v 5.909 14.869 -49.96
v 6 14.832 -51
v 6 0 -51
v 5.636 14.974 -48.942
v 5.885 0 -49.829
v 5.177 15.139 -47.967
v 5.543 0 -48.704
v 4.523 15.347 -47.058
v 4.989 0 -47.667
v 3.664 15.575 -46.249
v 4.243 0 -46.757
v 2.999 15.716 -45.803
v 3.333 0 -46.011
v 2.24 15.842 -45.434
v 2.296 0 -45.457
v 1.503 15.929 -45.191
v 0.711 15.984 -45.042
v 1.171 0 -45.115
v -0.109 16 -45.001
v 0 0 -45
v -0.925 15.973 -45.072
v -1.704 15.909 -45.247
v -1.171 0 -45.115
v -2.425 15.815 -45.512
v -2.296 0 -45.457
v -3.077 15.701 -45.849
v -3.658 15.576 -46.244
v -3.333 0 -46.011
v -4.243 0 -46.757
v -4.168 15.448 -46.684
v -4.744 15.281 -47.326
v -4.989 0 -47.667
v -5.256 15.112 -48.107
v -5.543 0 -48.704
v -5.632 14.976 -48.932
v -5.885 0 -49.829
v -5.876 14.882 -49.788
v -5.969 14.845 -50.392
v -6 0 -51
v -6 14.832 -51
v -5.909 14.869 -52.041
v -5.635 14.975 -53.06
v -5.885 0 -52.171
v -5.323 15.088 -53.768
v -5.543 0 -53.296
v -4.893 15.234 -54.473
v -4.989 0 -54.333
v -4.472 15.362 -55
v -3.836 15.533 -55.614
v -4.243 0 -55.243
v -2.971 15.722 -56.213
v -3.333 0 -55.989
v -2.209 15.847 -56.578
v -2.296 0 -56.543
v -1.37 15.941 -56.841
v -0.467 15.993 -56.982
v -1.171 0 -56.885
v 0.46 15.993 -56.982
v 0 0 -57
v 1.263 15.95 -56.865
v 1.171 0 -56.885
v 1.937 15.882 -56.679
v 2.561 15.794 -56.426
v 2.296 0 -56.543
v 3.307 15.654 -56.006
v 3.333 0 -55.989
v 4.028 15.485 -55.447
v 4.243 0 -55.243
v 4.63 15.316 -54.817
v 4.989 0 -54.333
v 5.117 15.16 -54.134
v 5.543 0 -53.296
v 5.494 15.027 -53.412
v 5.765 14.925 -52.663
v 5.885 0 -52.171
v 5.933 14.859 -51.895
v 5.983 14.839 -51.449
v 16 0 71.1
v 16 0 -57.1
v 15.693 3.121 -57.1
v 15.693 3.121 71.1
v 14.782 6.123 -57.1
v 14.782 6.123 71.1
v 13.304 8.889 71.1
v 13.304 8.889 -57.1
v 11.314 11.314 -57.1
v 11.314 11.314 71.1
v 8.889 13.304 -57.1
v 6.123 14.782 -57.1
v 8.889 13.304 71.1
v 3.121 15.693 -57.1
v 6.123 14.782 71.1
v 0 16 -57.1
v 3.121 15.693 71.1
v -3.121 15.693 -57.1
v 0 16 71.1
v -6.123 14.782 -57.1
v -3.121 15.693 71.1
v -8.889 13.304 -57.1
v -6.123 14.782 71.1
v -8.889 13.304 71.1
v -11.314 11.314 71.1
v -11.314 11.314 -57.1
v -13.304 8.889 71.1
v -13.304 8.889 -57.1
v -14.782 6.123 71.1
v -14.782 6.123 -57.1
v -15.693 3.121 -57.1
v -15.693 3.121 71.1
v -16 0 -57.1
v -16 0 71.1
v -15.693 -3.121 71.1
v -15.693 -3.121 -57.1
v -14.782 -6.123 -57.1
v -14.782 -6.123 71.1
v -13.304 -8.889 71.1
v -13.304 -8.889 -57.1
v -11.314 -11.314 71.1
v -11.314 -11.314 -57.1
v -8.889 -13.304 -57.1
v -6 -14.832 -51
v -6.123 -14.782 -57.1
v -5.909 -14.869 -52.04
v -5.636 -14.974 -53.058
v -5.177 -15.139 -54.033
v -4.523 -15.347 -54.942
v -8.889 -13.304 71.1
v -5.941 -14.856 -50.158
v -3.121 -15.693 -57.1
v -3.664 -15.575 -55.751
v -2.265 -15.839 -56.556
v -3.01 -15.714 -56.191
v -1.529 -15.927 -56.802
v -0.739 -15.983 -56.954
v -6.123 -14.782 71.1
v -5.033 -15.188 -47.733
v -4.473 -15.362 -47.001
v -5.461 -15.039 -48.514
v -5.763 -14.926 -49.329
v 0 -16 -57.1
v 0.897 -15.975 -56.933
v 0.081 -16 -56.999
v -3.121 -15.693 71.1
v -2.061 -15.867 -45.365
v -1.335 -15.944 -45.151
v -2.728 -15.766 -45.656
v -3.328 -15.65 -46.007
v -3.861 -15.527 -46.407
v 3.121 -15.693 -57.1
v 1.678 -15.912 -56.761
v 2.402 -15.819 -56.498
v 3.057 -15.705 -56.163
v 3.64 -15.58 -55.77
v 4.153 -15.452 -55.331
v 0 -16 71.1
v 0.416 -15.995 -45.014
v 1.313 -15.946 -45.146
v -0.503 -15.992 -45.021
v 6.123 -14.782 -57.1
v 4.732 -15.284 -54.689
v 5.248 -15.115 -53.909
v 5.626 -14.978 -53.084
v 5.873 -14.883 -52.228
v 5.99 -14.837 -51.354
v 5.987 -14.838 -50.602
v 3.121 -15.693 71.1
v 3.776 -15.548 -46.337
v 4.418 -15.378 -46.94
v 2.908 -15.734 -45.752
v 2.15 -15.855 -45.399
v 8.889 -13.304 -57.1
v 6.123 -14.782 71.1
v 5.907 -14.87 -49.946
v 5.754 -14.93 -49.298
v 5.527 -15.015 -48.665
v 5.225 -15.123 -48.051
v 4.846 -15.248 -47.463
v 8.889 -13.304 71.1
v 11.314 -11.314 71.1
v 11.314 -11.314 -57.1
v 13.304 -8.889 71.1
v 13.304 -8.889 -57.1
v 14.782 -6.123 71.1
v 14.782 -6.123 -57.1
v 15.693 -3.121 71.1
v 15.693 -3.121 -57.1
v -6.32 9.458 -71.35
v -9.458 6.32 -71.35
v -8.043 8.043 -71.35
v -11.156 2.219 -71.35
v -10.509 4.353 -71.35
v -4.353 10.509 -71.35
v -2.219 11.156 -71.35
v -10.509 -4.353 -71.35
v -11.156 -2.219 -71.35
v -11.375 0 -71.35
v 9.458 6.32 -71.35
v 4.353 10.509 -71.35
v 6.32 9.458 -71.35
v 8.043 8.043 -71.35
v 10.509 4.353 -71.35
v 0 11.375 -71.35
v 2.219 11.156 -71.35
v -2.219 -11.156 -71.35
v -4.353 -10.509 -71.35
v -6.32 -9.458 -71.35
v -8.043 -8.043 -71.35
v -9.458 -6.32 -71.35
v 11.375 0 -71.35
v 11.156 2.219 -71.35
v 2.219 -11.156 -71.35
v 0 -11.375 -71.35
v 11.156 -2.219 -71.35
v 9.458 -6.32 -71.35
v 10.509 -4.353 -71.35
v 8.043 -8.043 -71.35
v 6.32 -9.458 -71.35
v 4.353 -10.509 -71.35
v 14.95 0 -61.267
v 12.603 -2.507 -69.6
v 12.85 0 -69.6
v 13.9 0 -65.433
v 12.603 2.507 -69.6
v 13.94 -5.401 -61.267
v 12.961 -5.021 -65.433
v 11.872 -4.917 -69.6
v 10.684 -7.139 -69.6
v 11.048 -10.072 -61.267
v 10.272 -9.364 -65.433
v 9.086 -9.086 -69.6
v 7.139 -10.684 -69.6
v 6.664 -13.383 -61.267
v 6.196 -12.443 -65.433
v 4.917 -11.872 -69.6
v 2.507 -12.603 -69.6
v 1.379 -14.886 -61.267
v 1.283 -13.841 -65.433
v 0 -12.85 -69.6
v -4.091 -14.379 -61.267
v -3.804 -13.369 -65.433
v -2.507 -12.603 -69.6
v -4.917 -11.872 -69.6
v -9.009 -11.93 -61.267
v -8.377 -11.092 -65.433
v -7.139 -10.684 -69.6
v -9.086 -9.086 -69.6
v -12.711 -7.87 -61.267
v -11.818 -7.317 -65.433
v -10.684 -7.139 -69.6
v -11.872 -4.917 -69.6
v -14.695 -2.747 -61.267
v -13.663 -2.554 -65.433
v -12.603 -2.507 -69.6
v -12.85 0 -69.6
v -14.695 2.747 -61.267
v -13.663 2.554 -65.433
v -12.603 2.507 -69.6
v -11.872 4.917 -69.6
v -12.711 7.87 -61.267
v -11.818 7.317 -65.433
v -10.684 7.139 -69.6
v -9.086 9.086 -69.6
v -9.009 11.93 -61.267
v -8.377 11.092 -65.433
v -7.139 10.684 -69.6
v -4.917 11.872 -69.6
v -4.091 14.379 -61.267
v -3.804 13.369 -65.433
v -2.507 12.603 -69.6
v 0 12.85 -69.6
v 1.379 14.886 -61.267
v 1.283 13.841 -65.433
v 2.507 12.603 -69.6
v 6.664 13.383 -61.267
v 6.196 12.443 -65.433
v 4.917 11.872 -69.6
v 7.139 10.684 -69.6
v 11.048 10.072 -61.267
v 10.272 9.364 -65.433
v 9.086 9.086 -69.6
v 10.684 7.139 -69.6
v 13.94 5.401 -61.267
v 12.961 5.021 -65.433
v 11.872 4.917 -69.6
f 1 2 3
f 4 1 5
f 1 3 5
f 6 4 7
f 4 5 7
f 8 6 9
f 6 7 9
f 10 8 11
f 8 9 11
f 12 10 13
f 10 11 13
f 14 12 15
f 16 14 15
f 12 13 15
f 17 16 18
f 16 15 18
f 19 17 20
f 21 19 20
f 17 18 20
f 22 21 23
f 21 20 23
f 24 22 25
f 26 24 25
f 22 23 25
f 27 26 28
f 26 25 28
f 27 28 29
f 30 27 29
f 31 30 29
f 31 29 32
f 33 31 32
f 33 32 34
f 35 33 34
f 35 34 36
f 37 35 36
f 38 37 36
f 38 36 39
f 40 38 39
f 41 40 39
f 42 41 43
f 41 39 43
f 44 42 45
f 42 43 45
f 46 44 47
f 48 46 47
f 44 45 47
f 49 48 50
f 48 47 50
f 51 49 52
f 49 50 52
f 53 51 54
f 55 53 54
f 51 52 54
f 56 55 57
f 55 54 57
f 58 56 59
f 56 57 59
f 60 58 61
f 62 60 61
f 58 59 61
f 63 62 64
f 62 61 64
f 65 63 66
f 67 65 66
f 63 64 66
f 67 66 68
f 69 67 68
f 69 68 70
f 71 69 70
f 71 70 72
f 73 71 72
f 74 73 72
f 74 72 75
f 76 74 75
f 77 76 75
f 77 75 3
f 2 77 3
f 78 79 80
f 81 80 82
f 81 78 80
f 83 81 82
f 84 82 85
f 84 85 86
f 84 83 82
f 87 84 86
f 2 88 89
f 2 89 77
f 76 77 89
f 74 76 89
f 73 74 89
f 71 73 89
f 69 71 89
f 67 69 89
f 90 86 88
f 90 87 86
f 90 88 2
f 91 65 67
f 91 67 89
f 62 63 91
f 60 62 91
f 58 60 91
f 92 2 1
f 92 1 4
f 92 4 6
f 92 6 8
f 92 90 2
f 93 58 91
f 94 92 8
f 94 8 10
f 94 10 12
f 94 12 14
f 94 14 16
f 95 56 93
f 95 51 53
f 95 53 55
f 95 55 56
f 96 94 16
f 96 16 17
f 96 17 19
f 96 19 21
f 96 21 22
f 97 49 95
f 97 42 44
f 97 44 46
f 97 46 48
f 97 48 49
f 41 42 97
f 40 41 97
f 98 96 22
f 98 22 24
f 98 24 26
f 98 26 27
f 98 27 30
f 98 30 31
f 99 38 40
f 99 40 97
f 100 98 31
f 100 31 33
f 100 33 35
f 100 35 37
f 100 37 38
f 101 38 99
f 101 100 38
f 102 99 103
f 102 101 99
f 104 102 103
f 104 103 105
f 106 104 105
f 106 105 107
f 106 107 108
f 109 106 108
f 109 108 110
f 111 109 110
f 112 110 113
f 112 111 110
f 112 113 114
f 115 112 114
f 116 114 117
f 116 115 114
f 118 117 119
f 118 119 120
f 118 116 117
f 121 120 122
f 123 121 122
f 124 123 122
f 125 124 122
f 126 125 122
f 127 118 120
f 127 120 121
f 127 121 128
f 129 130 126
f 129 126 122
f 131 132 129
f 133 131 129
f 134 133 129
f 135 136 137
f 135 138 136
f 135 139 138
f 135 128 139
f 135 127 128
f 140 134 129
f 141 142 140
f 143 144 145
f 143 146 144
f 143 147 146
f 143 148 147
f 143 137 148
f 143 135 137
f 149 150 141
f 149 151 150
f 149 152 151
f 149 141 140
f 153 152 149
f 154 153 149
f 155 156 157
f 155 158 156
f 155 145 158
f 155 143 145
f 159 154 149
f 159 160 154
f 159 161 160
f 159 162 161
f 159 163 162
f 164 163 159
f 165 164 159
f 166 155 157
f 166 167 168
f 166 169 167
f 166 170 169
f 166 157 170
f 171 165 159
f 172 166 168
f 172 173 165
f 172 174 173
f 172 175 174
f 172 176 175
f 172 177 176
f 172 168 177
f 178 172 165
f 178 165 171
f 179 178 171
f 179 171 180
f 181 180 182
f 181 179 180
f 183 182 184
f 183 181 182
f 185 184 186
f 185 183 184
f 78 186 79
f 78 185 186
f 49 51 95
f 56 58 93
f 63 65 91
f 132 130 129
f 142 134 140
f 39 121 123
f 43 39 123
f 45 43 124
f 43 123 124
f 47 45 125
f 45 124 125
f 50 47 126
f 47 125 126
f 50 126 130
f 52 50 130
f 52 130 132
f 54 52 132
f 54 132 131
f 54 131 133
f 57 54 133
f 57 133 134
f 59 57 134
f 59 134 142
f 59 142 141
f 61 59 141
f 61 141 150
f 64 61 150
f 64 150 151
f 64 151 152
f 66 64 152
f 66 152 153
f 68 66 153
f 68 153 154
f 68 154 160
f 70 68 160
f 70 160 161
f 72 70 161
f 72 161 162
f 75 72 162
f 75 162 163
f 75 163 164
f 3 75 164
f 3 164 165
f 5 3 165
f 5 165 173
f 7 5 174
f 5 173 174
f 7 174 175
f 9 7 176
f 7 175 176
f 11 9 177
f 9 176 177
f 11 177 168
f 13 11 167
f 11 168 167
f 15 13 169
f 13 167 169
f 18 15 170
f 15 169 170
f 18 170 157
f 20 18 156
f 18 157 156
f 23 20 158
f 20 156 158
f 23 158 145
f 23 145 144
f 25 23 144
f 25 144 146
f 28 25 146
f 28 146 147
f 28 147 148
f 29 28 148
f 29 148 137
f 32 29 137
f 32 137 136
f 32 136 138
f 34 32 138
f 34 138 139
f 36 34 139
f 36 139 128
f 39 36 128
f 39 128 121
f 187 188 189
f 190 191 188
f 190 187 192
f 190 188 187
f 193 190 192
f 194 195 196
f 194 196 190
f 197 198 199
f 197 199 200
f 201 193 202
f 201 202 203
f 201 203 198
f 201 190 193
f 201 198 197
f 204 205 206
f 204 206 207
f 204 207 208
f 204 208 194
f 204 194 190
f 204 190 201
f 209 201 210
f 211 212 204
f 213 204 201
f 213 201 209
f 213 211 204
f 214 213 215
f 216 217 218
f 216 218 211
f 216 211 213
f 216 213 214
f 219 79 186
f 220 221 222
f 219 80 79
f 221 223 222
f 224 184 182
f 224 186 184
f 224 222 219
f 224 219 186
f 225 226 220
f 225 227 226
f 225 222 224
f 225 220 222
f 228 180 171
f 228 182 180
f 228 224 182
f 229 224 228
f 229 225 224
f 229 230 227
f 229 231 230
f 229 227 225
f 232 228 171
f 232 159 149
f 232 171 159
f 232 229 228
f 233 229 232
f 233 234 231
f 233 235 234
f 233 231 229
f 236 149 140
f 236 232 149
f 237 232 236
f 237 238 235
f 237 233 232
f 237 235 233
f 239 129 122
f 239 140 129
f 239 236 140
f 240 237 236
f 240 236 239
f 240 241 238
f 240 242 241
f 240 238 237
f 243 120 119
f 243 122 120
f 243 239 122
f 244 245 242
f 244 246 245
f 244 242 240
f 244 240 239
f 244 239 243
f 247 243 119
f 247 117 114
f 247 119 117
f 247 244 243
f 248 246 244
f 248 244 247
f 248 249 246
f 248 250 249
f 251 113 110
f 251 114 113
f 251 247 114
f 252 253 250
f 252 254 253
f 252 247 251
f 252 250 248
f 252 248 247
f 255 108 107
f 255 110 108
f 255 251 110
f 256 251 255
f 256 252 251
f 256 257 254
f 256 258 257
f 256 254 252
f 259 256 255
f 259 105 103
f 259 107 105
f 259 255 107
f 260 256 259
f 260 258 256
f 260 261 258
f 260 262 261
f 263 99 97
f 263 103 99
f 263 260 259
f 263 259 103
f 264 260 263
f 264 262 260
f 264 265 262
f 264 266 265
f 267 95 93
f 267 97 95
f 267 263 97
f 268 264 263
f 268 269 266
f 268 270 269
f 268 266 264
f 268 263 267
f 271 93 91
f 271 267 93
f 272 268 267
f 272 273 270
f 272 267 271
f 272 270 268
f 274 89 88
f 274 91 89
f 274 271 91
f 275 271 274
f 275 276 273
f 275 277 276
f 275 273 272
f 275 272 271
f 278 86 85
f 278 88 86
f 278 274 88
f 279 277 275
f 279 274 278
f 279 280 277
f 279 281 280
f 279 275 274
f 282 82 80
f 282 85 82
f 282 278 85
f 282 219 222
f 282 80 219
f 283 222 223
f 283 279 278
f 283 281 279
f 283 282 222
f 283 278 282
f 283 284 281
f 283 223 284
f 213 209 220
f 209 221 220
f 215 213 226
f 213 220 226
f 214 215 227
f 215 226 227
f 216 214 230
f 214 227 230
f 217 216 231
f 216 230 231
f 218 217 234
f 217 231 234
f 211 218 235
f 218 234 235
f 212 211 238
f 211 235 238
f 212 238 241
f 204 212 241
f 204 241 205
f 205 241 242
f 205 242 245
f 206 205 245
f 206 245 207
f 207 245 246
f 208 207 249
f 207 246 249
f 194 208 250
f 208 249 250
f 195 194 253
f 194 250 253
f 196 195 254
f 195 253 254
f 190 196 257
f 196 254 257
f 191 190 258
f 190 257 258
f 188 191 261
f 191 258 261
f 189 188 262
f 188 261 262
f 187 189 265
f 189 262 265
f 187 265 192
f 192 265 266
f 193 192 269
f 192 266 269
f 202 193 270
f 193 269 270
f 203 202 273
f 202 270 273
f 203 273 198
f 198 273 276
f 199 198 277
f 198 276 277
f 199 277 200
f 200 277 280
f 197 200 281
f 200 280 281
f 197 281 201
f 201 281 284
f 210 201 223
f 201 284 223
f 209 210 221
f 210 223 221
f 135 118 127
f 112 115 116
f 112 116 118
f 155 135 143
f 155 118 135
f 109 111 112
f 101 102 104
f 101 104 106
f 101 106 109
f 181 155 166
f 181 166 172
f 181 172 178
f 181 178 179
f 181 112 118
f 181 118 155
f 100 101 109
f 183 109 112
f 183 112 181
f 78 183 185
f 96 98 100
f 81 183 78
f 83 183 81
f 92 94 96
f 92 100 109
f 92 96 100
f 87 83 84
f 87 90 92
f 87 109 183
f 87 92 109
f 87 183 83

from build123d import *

# Parameters (mm, degrees)
F1_R      = 16
F2_DEPTH  = 71.1
F3_DEPTH  = 57.1
F3_FACE_R = 16
F5_R      = 12.85
F8_R      = 11.375
F6_FACE_R = 12.85
F10_D     = 12
F10_DEPTH = 16.0010001
F12_D     = 12


with BuildPart() as f2:
    # F1 (on Top) → F2 (new body)
    with BuildSketch(Plane.XY):
        Circle(F1_R)
    extrude(amount=F2_DEPTH)

    # F3 (add): a face of the model
    f3_faces = [f2.faces().sort_by_distance(p)[0] for p in [
        (0, 0, 0),
    ]]
    extrude(f3_faces, amount=F3_DEPTH)

    # F3_face (on face) → F6 section 0
    with BuildSketch(Plane(origin=(0, 0, -57.1), x_dir=(1, 0, 0), z_dir=(0, 0, -1))):
        Circle(F3_FACE_R)
    # F5 (on offset) → F6 section 1
    with BuildSketch(Plane(origin=(0, 0, -69.6), x_dir=(1, 0, 0), z_dir=(0, 0, -1))):
        Circle(F5_R)
    loft()

    # F8 (on offset) → F9 section 0
    with BuildSketch(Plane(origin=(0, 0, -71.35), x_dir=(1, 0, 0), z_dir=(0, 0, -1))):
        Circle(F8_R)
    # F6_face (on face) → F9 section 1
    with BuildSketch(Plane(origin=(0, 0, -69.6), x_dir=(1, 0, 0), z_dir=(0, 0, -1))):
        Circle(F6_FACE_R)
    loft()

    # F10 (through all, one way)
    with BuildSketch(Plane.XZ):
        with Locations((0, -51)):
            Circle(F10_D / 2)
    extrude(amount=-F10_DEPTH, mode=Mode.SUBTRACT)

    # F12 (through all)
    with Locations(Plane(origin=(0, 0, 0), x_dir=(1, 0, 0), z_dir=(0, 1, 0))):
        with Locations((0, 51)):
            Hole(F12_D / 2)


solid = f2.part
